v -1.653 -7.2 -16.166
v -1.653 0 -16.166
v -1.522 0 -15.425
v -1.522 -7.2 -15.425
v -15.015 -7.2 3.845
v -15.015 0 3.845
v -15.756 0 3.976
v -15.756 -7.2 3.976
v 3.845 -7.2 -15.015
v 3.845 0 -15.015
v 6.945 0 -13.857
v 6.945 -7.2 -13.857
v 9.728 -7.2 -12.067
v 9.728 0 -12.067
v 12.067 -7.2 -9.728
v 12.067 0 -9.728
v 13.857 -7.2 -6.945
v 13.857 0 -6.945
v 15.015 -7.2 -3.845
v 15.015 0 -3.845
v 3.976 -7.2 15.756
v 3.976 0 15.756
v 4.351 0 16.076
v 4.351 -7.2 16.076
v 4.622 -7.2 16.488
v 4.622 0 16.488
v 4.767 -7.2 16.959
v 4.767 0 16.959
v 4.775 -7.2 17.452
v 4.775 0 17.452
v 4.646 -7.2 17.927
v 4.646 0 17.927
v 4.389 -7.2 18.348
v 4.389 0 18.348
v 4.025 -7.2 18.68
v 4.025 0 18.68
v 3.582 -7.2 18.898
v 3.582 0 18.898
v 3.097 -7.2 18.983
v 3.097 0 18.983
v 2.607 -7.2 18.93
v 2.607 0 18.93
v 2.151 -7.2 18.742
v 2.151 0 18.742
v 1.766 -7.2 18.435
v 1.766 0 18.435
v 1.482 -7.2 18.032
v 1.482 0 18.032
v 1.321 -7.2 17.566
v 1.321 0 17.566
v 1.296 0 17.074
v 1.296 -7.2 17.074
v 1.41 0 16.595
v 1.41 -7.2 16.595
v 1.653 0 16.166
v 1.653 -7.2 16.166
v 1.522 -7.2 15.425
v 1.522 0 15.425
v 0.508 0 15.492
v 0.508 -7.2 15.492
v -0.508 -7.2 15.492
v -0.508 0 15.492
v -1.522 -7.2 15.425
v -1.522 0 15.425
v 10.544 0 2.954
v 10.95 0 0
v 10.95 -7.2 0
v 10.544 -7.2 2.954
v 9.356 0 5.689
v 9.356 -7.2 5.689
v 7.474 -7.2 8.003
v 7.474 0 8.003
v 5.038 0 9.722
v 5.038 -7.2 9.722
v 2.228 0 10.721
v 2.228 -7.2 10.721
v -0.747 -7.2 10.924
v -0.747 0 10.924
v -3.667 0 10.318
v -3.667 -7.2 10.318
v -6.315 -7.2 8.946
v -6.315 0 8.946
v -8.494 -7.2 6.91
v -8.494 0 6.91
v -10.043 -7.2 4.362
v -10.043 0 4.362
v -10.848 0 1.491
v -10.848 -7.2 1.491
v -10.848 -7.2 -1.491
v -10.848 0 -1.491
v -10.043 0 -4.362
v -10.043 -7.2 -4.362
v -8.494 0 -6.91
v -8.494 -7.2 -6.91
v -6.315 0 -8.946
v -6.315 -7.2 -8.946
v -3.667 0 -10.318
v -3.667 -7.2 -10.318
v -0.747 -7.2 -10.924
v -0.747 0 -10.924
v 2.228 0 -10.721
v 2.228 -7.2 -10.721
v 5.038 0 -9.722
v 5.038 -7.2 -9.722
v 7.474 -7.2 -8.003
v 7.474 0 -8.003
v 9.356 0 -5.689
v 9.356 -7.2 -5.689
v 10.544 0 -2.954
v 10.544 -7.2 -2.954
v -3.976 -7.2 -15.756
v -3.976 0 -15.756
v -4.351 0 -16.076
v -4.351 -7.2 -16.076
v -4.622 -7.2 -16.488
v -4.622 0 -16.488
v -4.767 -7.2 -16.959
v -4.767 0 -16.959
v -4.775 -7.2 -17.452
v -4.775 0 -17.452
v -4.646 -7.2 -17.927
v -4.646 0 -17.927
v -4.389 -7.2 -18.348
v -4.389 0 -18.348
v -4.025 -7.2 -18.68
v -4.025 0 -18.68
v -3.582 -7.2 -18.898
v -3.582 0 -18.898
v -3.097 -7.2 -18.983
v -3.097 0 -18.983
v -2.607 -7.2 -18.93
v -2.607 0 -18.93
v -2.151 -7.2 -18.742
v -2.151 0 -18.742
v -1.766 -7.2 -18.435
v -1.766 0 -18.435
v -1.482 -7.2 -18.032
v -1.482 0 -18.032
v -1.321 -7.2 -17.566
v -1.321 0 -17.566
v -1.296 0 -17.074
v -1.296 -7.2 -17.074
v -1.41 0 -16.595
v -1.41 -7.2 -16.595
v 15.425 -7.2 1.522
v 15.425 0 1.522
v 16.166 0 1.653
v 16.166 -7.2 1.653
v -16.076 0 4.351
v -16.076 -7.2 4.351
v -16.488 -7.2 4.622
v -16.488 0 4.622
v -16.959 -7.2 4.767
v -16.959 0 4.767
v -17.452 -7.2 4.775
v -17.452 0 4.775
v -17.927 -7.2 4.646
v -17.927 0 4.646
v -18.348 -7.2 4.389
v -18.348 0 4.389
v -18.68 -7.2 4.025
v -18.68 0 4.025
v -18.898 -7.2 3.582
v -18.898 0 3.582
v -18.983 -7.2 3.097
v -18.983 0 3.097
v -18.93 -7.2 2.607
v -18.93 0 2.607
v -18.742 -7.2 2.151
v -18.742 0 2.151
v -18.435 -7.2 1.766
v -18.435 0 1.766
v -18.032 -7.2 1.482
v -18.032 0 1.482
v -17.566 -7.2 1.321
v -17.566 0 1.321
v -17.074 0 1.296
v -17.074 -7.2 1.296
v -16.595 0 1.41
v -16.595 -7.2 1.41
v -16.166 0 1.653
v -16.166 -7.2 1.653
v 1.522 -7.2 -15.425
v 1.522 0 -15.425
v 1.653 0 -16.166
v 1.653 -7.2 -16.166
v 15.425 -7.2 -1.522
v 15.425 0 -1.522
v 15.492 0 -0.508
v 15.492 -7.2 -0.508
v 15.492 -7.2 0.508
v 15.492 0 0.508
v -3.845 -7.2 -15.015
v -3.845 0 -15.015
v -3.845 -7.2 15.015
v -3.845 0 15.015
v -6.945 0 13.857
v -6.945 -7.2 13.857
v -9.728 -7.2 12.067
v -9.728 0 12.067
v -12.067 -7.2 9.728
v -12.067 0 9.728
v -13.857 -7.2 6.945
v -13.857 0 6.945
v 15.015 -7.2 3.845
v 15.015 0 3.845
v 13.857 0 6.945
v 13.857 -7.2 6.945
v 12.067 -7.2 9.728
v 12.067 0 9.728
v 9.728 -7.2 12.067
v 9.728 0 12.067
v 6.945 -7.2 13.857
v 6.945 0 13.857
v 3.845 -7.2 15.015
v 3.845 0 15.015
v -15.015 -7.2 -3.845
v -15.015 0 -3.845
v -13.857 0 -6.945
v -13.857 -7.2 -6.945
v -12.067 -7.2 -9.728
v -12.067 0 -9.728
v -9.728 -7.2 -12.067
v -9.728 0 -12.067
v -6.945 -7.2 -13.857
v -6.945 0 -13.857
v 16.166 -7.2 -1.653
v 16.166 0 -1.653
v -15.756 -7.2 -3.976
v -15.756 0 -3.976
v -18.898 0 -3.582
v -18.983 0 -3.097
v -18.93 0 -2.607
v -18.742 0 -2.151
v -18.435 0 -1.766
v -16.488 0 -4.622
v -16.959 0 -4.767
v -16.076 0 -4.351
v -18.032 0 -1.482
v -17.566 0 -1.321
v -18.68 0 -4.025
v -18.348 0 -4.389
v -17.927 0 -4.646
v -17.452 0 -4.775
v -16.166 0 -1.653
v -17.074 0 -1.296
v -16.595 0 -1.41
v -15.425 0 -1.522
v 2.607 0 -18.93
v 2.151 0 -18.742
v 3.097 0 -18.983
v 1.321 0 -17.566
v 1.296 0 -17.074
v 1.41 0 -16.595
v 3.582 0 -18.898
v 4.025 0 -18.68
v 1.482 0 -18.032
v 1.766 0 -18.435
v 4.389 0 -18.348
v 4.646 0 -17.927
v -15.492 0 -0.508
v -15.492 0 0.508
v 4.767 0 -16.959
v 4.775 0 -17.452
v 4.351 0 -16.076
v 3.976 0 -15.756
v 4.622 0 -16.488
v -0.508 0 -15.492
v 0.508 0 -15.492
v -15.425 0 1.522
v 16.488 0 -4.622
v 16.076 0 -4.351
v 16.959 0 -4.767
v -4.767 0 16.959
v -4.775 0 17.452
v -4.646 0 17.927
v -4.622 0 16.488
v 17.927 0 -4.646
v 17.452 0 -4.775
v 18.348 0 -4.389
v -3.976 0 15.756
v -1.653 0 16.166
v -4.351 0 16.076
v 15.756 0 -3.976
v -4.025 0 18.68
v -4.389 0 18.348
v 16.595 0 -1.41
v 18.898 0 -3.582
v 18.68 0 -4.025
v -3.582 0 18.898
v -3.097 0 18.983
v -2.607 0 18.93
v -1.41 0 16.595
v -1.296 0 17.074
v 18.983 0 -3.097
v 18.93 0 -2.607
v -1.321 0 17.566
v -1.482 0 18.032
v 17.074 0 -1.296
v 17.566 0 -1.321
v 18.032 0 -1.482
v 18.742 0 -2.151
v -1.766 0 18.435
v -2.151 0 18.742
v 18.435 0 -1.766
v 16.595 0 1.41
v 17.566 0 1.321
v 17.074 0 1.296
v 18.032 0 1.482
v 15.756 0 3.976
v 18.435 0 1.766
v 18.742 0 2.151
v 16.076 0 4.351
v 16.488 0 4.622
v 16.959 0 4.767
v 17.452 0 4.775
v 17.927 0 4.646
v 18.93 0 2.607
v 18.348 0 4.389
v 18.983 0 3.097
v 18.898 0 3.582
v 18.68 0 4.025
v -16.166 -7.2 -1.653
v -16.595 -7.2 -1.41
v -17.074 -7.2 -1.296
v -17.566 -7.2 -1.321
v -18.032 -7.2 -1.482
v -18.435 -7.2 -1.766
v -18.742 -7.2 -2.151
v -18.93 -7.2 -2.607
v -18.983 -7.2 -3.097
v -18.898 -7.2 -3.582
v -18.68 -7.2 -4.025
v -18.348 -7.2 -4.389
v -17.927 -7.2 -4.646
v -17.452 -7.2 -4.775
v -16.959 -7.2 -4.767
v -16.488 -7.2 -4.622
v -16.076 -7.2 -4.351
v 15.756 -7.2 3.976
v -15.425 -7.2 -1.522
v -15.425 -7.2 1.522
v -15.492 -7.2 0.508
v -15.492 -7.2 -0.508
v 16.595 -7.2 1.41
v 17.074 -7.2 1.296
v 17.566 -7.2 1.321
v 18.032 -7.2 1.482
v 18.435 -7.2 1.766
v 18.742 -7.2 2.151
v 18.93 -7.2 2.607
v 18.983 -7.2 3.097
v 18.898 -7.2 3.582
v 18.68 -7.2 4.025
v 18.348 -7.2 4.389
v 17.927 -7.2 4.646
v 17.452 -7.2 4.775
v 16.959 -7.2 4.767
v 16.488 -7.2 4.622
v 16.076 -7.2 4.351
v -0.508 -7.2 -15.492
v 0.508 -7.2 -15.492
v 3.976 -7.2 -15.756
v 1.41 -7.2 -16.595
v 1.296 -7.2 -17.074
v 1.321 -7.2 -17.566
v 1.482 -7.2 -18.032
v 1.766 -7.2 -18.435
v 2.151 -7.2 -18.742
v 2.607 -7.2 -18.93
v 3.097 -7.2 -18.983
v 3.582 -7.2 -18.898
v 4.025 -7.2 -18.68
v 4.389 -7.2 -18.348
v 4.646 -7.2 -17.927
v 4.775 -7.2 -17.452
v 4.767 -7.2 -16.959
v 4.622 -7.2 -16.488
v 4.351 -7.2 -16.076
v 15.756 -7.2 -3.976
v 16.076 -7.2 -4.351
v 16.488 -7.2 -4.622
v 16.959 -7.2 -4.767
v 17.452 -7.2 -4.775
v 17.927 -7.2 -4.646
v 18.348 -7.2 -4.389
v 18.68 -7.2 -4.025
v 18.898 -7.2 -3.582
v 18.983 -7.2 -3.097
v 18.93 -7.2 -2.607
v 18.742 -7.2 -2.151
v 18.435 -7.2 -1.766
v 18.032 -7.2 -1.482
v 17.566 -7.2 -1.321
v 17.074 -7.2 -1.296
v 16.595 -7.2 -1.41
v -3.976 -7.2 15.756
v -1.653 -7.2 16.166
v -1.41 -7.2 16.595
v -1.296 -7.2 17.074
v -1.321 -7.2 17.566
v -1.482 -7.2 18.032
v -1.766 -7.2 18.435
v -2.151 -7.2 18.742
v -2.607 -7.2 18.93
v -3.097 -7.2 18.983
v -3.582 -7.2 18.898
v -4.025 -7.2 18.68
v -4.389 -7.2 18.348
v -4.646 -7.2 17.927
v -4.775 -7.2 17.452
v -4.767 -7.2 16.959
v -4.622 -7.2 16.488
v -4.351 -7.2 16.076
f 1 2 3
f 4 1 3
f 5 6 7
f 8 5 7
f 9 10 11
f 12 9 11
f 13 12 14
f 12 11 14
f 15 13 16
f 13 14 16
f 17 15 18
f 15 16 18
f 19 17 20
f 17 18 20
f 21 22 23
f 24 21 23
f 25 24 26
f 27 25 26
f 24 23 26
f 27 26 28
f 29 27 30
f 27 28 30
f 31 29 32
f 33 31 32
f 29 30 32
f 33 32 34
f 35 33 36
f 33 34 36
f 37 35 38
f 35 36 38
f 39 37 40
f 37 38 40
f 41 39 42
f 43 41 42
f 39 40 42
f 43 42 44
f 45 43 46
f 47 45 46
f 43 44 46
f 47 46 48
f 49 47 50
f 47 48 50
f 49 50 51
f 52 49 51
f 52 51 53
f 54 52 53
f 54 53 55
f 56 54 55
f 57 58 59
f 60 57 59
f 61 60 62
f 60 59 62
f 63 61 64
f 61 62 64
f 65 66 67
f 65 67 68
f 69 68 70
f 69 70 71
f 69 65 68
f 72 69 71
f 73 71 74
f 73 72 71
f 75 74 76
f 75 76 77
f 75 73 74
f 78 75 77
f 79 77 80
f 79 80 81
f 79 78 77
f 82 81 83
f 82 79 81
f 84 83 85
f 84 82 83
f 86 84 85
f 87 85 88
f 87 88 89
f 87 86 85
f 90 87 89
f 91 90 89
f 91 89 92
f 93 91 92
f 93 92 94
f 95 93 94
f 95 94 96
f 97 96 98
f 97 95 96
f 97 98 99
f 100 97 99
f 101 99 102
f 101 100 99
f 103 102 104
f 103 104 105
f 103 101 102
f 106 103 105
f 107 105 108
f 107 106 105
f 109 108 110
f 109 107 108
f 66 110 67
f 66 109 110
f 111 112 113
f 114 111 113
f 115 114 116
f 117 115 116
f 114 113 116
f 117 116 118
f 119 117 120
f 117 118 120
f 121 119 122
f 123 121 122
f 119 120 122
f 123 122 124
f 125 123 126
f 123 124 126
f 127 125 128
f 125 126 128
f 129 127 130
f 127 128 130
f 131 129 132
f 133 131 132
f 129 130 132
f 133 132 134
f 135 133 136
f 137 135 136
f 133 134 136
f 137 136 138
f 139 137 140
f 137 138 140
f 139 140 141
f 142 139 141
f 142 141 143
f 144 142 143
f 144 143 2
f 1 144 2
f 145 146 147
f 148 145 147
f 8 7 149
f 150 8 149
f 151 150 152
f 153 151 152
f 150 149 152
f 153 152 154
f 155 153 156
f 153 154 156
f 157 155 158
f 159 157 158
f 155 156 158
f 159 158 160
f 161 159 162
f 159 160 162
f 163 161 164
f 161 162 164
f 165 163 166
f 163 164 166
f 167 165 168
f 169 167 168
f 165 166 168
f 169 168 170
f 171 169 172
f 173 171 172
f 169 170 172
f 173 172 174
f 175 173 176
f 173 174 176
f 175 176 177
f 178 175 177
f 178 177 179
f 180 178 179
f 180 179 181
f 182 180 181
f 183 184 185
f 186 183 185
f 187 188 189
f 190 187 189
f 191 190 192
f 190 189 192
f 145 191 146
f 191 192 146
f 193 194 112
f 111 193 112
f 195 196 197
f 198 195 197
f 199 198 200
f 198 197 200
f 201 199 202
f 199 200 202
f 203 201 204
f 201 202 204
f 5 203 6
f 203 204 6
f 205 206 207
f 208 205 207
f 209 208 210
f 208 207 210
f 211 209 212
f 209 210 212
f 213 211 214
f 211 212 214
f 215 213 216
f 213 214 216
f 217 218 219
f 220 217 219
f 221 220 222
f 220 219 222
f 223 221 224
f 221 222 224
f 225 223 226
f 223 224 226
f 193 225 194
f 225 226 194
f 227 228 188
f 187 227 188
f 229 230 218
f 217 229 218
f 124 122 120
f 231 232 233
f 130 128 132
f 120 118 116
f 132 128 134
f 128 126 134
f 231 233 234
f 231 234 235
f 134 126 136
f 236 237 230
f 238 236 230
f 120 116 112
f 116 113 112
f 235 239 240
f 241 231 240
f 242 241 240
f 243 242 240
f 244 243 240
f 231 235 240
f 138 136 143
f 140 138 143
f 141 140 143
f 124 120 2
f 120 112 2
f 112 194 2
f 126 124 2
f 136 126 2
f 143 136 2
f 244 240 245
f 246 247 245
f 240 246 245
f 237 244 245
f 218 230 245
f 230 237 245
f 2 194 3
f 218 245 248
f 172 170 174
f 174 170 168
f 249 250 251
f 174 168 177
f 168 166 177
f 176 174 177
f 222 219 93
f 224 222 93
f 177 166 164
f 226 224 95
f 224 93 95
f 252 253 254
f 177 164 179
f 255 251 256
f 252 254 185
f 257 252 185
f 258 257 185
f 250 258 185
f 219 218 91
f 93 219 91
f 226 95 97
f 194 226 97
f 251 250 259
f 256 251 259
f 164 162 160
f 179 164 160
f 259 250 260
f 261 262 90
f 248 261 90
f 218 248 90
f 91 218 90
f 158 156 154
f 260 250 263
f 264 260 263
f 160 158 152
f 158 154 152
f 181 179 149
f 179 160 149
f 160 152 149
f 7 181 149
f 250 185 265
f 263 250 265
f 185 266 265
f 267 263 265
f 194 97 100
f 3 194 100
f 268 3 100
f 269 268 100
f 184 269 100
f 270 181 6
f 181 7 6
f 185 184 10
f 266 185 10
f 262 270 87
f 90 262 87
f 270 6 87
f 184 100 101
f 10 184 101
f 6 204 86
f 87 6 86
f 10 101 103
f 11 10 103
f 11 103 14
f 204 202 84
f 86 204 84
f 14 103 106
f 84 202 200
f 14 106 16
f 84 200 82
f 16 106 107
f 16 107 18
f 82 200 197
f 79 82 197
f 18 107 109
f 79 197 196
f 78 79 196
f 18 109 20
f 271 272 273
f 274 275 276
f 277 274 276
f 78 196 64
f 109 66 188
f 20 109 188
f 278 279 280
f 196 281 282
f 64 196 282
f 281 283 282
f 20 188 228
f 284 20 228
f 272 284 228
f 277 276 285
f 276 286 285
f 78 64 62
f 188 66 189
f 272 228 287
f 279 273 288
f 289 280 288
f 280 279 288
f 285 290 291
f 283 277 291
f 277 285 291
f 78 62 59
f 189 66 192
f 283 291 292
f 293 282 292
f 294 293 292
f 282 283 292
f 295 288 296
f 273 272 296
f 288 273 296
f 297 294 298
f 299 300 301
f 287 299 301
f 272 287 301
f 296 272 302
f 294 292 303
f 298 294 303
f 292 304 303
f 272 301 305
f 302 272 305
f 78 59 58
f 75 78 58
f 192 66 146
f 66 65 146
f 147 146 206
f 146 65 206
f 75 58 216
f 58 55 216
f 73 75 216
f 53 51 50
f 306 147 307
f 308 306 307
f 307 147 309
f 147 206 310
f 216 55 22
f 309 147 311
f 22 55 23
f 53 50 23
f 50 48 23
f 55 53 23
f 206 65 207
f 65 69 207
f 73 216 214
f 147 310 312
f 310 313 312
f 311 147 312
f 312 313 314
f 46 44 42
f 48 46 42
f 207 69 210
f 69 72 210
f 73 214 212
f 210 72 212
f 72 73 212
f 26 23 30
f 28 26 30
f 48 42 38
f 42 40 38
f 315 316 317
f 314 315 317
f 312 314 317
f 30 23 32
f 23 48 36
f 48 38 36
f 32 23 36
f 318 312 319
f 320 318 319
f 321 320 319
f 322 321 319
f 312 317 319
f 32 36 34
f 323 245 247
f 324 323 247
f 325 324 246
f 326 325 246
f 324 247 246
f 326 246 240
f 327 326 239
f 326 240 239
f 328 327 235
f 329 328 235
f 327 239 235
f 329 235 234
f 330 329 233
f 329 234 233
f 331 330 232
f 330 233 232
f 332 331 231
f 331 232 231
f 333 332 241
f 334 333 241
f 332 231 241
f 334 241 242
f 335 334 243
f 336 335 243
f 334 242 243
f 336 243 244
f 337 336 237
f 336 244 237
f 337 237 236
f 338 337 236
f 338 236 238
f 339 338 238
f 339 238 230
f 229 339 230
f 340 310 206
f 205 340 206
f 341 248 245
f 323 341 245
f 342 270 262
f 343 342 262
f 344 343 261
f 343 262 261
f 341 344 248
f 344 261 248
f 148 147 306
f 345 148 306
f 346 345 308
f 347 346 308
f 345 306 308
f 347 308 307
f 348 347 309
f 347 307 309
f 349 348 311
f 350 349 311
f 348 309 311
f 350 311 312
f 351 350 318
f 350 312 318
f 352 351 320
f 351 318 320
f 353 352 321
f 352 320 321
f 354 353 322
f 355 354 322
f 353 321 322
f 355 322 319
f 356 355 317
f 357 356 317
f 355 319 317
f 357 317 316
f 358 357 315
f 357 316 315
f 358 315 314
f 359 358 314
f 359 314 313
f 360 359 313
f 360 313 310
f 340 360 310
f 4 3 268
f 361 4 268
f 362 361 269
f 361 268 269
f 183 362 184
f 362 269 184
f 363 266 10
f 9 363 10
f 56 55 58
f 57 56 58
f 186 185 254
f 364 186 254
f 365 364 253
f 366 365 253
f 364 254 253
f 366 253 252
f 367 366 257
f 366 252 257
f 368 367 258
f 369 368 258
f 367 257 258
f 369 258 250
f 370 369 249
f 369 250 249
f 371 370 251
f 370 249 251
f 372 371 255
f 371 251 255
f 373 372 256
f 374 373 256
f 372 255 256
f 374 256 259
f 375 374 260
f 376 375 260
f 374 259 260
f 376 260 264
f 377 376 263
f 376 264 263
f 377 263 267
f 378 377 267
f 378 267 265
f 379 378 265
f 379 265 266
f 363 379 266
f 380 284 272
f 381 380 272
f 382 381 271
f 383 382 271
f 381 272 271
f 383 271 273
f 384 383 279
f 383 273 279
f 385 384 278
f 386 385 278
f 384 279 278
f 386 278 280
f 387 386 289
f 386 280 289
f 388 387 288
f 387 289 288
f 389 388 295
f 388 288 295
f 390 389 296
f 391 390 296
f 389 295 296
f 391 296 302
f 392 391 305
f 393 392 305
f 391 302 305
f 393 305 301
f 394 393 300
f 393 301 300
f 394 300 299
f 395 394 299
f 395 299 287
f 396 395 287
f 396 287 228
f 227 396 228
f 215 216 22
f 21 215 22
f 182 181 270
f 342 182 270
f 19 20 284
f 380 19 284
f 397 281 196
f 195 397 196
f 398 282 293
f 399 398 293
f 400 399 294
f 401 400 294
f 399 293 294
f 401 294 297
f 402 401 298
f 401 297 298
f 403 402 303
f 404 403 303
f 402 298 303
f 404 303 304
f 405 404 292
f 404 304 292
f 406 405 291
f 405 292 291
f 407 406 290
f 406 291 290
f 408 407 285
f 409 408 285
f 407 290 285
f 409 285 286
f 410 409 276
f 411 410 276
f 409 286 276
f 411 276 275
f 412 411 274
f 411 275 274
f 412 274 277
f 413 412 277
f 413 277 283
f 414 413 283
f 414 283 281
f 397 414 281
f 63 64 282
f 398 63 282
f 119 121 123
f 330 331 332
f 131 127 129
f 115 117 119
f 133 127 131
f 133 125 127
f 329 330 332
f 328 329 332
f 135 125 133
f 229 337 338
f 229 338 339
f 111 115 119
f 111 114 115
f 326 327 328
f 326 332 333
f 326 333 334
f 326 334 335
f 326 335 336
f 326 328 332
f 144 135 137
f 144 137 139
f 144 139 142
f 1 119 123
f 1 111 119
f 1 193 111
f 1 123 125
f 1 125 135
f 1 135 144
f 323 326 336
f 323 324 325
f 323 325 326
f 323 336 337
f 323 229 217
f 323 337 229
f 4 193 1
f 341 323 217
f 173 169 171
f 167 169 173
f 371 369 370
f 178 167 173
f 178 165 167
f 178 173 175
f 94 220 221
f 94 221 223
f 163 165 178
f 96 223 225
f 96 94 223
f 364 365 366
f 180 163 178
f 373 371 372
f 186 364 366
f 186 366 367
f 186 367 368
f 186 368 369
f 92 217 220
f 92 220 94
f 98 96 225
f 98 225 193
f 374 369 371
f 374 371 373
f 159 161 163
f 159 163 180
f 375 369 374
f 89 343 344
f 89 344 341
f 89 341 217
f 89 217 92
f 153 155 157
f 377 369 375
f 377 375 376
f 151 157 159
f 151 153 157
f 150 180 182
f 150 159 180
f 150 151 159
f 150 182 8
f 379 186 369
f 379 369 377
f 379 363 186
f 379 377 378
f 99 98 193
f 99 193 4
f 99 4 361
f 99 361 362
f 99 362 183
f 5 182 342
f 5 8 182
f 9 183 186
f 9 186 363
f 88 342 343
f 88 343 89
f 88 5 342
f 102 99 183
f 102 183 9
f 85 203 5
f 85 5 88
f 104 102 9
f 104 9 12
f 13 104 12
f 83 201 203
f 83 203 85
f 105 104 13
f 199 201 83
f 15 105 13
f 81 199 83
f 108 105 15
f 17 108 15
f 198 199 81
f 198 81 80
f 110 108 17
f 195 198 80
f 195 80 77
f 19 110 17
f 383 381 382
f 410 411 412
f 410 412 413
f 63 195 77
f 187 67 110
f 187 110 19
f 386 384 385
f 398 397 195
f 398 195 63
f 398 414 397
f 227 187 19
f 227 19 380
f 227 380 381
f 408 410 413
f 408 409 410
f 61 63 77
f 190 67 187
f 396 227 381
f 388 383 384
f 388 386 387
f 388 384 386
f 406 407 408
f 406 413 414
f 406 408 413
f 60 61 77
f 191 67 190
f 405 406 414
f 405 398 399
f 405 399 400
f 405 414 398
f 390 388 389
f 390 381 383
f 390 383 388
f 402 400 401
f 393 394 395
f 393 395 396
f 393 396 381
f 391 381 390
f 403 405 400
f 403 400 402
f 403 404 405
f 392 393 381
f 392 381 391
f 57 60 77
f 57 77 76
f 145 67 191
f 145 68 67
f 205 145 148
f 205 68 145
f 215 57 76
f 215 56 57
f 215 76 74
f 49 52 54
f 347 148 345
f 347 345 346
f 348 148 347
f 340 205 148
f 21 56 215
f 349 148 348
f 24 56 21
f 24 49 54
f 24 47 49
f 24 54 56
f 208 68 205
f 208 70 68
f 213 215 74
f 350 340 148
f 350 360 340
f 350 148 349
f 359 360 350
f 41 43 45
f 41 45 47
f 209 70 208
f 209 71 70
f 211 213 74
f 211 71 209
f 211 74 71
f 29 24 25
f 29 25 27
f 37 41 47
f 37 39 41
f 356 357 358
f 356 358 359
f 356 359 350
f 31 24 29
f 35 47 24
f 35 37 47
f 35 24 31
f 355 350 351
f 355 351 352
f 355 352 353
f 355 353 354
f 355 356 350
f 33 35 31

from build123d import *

# Parameters (mm, degrees)
F0_R     = 10.95
F1_DEPTH = 7.2


with BuildPart() as f1:
    # F0 (on Front) → F1 (new body)
    with BuildSketch(Plane.XZ):
        with BuildLine():
            Line((-3.975838, 15.756117), (-3.845241, 15.015463))
            ThreePointArc((-3.845241, 15.015463), (-10.960155, 10.960155), (-15.015463, 3.845241))
            ThreePointArc((-15.015463, 3.845241), (-15.26452, 2.691547), (-15.425069, 1.522246))
            ThreePointArc((-15.425069, 1.522246), (-15.5, 0), (-15.425069, -1.522246))
            ThreePointArc((-15.425069, -1.522246), (-15.26452, -2.691547), (-15.015463, -3.845241))
            ThreePointArc((-15.015463, -3.845241), (-10.960155, -10.960155), (-3.845241, -15.015463))
            ThreePointArc((-3.845241, -15.015463), (-2.691547, -15.26452), (-1.522246, -15.425069))
            ThreePointArc((-1.522246, -15.425069), (0, -15.5), (1.522246, -15.425069))
            ThreePointArc((1.522246, -15.425069), (2.691547, -15.26452), (3.845241, -15.015463))
            ThreePointArc((3.845241, -15.015463), (10.960155, -10.960155), (15.015463, -3.845241))
            ThreePointArc((15.015463, -3.845241), (15.26452, -2.691547), (15.425069, -1.522246))
            ThreePointArc((15.425069, -1.522246), (15.5, 0), (15.425069, 1.522246))
            ThreePointArc((15.425069, 1.522246), (15.26452, 2.691547), (15.015463, 3.845241))
            ThreePointArc((15.015463, 3.845241), (10.960155, 10.960155), (3.845241, 15.015463))
            Line((3.845241, 15.015463), (3.975838, 15.756117))
            ThreePointArc((3.975838, 15.756117), (3.342727, 18.957549), (1.652844, 16.165723))
            Line((1.652844, 16.165723), (1.522246, 15.425069))
            ThreePointArc((1.522246, 15.425069), (0, 15.5), (-1.522246, 15.425069))
            Line((-1.522246, 15.425069), (-1.652844, 16.165723))
            ThreePointArc((-1.652844, 16.165723), (-3.342727, 18.957549), (-3.975838, 15.756117))
        make_face()
        Circle(F0_R, mode=Mode.SUBTRACT)
        with BuildLine():
            ThreePointArc((-15.425069, 1.522246), (-15.26452, 2.691547), (-15.015463, 3.845241))
            Line((-15.015463, 3.845241), (-15.756117, 3.975838))
            ThreePointArc((-15.756117, 3.975838), (-18.957549, 3.342727), (-16.165723, 1.652844))
            Line((-16.165723, 1.652844), (-15.425069, 1.522246))
        make_face()
        with BuildLine():
            ThreePointArc((-15.015463, -3.845241), (-15.26452, -2.691547), (-15.425069, -1.522246))
            Line((-15.425069, -1.522246), (-16.165723, -1.652844))
            ThreePointArc((-16.165723, -1.652844), (-18.957549, -3.342727), (-15.756117, -3.975838))
            Line((-15.756117, -3.975838), (-15.015463, -3.845241))
        make_face()
        with BuildLine():
            ThreePointArc((-1.522246, -15.425069), (-2.691547, -15.26452), (-3.845241, -15.015463))
            Line((-3.845241, -15.015463), (-3.975838, -15.756117))
            ThreePointArc((-3.975838, -15.756117), (-3.342727, -18.957549), (-1.652844, -16.165723))
            Line((-1.652844, -16.165723), (-1.522246, -15.425069))
        make_face()
        with BuildLine():
            ThreePointArc((3.845241, -15.015463), (2.691547, -15.26452), (1.522246, -15.425069))
            Line((1.522246, -15.425069), (1.652844, -16.165723))
            ThreePointArc((1.652844, -16.165723), (3.342727, -18.957549), (3.975838, -15.756117))
            Line((3.975838, -15.756117), (3.845241, -15.015463))
        make_face()
        with BuildLine():
            Line((15.756117, 3.975838), (15.015463, 3.845241))
            ThreePointArc((15.015463, 3.845241), (15.26452, 2.691547), (15.425069, 1.522246))
            Line((15.425069, 1.522246), (16.165723, 1.652844))
            ThreePointArc((16.165723, 1.652844), (18.957549, 3.342727), (15.756117, 3.975838))
        make_face()
        with BuildLine():
            ThreePointArc((15.425069, -1.522246), (15.26452, -2.691547), (15.015463, -3.845241))
            Line((15.015463, -3.845241), (15.756117, -3.975838))
            ThreePointArc((15.756117, -3.975838), (18.957549, -3.342727), (16.165723, -1.652844))
            Line((16.165723, -1.652844), (15.425069, -1.522246))
        make_face()
    extrude(amount=F1_DEPTH)


solid = f1.part
